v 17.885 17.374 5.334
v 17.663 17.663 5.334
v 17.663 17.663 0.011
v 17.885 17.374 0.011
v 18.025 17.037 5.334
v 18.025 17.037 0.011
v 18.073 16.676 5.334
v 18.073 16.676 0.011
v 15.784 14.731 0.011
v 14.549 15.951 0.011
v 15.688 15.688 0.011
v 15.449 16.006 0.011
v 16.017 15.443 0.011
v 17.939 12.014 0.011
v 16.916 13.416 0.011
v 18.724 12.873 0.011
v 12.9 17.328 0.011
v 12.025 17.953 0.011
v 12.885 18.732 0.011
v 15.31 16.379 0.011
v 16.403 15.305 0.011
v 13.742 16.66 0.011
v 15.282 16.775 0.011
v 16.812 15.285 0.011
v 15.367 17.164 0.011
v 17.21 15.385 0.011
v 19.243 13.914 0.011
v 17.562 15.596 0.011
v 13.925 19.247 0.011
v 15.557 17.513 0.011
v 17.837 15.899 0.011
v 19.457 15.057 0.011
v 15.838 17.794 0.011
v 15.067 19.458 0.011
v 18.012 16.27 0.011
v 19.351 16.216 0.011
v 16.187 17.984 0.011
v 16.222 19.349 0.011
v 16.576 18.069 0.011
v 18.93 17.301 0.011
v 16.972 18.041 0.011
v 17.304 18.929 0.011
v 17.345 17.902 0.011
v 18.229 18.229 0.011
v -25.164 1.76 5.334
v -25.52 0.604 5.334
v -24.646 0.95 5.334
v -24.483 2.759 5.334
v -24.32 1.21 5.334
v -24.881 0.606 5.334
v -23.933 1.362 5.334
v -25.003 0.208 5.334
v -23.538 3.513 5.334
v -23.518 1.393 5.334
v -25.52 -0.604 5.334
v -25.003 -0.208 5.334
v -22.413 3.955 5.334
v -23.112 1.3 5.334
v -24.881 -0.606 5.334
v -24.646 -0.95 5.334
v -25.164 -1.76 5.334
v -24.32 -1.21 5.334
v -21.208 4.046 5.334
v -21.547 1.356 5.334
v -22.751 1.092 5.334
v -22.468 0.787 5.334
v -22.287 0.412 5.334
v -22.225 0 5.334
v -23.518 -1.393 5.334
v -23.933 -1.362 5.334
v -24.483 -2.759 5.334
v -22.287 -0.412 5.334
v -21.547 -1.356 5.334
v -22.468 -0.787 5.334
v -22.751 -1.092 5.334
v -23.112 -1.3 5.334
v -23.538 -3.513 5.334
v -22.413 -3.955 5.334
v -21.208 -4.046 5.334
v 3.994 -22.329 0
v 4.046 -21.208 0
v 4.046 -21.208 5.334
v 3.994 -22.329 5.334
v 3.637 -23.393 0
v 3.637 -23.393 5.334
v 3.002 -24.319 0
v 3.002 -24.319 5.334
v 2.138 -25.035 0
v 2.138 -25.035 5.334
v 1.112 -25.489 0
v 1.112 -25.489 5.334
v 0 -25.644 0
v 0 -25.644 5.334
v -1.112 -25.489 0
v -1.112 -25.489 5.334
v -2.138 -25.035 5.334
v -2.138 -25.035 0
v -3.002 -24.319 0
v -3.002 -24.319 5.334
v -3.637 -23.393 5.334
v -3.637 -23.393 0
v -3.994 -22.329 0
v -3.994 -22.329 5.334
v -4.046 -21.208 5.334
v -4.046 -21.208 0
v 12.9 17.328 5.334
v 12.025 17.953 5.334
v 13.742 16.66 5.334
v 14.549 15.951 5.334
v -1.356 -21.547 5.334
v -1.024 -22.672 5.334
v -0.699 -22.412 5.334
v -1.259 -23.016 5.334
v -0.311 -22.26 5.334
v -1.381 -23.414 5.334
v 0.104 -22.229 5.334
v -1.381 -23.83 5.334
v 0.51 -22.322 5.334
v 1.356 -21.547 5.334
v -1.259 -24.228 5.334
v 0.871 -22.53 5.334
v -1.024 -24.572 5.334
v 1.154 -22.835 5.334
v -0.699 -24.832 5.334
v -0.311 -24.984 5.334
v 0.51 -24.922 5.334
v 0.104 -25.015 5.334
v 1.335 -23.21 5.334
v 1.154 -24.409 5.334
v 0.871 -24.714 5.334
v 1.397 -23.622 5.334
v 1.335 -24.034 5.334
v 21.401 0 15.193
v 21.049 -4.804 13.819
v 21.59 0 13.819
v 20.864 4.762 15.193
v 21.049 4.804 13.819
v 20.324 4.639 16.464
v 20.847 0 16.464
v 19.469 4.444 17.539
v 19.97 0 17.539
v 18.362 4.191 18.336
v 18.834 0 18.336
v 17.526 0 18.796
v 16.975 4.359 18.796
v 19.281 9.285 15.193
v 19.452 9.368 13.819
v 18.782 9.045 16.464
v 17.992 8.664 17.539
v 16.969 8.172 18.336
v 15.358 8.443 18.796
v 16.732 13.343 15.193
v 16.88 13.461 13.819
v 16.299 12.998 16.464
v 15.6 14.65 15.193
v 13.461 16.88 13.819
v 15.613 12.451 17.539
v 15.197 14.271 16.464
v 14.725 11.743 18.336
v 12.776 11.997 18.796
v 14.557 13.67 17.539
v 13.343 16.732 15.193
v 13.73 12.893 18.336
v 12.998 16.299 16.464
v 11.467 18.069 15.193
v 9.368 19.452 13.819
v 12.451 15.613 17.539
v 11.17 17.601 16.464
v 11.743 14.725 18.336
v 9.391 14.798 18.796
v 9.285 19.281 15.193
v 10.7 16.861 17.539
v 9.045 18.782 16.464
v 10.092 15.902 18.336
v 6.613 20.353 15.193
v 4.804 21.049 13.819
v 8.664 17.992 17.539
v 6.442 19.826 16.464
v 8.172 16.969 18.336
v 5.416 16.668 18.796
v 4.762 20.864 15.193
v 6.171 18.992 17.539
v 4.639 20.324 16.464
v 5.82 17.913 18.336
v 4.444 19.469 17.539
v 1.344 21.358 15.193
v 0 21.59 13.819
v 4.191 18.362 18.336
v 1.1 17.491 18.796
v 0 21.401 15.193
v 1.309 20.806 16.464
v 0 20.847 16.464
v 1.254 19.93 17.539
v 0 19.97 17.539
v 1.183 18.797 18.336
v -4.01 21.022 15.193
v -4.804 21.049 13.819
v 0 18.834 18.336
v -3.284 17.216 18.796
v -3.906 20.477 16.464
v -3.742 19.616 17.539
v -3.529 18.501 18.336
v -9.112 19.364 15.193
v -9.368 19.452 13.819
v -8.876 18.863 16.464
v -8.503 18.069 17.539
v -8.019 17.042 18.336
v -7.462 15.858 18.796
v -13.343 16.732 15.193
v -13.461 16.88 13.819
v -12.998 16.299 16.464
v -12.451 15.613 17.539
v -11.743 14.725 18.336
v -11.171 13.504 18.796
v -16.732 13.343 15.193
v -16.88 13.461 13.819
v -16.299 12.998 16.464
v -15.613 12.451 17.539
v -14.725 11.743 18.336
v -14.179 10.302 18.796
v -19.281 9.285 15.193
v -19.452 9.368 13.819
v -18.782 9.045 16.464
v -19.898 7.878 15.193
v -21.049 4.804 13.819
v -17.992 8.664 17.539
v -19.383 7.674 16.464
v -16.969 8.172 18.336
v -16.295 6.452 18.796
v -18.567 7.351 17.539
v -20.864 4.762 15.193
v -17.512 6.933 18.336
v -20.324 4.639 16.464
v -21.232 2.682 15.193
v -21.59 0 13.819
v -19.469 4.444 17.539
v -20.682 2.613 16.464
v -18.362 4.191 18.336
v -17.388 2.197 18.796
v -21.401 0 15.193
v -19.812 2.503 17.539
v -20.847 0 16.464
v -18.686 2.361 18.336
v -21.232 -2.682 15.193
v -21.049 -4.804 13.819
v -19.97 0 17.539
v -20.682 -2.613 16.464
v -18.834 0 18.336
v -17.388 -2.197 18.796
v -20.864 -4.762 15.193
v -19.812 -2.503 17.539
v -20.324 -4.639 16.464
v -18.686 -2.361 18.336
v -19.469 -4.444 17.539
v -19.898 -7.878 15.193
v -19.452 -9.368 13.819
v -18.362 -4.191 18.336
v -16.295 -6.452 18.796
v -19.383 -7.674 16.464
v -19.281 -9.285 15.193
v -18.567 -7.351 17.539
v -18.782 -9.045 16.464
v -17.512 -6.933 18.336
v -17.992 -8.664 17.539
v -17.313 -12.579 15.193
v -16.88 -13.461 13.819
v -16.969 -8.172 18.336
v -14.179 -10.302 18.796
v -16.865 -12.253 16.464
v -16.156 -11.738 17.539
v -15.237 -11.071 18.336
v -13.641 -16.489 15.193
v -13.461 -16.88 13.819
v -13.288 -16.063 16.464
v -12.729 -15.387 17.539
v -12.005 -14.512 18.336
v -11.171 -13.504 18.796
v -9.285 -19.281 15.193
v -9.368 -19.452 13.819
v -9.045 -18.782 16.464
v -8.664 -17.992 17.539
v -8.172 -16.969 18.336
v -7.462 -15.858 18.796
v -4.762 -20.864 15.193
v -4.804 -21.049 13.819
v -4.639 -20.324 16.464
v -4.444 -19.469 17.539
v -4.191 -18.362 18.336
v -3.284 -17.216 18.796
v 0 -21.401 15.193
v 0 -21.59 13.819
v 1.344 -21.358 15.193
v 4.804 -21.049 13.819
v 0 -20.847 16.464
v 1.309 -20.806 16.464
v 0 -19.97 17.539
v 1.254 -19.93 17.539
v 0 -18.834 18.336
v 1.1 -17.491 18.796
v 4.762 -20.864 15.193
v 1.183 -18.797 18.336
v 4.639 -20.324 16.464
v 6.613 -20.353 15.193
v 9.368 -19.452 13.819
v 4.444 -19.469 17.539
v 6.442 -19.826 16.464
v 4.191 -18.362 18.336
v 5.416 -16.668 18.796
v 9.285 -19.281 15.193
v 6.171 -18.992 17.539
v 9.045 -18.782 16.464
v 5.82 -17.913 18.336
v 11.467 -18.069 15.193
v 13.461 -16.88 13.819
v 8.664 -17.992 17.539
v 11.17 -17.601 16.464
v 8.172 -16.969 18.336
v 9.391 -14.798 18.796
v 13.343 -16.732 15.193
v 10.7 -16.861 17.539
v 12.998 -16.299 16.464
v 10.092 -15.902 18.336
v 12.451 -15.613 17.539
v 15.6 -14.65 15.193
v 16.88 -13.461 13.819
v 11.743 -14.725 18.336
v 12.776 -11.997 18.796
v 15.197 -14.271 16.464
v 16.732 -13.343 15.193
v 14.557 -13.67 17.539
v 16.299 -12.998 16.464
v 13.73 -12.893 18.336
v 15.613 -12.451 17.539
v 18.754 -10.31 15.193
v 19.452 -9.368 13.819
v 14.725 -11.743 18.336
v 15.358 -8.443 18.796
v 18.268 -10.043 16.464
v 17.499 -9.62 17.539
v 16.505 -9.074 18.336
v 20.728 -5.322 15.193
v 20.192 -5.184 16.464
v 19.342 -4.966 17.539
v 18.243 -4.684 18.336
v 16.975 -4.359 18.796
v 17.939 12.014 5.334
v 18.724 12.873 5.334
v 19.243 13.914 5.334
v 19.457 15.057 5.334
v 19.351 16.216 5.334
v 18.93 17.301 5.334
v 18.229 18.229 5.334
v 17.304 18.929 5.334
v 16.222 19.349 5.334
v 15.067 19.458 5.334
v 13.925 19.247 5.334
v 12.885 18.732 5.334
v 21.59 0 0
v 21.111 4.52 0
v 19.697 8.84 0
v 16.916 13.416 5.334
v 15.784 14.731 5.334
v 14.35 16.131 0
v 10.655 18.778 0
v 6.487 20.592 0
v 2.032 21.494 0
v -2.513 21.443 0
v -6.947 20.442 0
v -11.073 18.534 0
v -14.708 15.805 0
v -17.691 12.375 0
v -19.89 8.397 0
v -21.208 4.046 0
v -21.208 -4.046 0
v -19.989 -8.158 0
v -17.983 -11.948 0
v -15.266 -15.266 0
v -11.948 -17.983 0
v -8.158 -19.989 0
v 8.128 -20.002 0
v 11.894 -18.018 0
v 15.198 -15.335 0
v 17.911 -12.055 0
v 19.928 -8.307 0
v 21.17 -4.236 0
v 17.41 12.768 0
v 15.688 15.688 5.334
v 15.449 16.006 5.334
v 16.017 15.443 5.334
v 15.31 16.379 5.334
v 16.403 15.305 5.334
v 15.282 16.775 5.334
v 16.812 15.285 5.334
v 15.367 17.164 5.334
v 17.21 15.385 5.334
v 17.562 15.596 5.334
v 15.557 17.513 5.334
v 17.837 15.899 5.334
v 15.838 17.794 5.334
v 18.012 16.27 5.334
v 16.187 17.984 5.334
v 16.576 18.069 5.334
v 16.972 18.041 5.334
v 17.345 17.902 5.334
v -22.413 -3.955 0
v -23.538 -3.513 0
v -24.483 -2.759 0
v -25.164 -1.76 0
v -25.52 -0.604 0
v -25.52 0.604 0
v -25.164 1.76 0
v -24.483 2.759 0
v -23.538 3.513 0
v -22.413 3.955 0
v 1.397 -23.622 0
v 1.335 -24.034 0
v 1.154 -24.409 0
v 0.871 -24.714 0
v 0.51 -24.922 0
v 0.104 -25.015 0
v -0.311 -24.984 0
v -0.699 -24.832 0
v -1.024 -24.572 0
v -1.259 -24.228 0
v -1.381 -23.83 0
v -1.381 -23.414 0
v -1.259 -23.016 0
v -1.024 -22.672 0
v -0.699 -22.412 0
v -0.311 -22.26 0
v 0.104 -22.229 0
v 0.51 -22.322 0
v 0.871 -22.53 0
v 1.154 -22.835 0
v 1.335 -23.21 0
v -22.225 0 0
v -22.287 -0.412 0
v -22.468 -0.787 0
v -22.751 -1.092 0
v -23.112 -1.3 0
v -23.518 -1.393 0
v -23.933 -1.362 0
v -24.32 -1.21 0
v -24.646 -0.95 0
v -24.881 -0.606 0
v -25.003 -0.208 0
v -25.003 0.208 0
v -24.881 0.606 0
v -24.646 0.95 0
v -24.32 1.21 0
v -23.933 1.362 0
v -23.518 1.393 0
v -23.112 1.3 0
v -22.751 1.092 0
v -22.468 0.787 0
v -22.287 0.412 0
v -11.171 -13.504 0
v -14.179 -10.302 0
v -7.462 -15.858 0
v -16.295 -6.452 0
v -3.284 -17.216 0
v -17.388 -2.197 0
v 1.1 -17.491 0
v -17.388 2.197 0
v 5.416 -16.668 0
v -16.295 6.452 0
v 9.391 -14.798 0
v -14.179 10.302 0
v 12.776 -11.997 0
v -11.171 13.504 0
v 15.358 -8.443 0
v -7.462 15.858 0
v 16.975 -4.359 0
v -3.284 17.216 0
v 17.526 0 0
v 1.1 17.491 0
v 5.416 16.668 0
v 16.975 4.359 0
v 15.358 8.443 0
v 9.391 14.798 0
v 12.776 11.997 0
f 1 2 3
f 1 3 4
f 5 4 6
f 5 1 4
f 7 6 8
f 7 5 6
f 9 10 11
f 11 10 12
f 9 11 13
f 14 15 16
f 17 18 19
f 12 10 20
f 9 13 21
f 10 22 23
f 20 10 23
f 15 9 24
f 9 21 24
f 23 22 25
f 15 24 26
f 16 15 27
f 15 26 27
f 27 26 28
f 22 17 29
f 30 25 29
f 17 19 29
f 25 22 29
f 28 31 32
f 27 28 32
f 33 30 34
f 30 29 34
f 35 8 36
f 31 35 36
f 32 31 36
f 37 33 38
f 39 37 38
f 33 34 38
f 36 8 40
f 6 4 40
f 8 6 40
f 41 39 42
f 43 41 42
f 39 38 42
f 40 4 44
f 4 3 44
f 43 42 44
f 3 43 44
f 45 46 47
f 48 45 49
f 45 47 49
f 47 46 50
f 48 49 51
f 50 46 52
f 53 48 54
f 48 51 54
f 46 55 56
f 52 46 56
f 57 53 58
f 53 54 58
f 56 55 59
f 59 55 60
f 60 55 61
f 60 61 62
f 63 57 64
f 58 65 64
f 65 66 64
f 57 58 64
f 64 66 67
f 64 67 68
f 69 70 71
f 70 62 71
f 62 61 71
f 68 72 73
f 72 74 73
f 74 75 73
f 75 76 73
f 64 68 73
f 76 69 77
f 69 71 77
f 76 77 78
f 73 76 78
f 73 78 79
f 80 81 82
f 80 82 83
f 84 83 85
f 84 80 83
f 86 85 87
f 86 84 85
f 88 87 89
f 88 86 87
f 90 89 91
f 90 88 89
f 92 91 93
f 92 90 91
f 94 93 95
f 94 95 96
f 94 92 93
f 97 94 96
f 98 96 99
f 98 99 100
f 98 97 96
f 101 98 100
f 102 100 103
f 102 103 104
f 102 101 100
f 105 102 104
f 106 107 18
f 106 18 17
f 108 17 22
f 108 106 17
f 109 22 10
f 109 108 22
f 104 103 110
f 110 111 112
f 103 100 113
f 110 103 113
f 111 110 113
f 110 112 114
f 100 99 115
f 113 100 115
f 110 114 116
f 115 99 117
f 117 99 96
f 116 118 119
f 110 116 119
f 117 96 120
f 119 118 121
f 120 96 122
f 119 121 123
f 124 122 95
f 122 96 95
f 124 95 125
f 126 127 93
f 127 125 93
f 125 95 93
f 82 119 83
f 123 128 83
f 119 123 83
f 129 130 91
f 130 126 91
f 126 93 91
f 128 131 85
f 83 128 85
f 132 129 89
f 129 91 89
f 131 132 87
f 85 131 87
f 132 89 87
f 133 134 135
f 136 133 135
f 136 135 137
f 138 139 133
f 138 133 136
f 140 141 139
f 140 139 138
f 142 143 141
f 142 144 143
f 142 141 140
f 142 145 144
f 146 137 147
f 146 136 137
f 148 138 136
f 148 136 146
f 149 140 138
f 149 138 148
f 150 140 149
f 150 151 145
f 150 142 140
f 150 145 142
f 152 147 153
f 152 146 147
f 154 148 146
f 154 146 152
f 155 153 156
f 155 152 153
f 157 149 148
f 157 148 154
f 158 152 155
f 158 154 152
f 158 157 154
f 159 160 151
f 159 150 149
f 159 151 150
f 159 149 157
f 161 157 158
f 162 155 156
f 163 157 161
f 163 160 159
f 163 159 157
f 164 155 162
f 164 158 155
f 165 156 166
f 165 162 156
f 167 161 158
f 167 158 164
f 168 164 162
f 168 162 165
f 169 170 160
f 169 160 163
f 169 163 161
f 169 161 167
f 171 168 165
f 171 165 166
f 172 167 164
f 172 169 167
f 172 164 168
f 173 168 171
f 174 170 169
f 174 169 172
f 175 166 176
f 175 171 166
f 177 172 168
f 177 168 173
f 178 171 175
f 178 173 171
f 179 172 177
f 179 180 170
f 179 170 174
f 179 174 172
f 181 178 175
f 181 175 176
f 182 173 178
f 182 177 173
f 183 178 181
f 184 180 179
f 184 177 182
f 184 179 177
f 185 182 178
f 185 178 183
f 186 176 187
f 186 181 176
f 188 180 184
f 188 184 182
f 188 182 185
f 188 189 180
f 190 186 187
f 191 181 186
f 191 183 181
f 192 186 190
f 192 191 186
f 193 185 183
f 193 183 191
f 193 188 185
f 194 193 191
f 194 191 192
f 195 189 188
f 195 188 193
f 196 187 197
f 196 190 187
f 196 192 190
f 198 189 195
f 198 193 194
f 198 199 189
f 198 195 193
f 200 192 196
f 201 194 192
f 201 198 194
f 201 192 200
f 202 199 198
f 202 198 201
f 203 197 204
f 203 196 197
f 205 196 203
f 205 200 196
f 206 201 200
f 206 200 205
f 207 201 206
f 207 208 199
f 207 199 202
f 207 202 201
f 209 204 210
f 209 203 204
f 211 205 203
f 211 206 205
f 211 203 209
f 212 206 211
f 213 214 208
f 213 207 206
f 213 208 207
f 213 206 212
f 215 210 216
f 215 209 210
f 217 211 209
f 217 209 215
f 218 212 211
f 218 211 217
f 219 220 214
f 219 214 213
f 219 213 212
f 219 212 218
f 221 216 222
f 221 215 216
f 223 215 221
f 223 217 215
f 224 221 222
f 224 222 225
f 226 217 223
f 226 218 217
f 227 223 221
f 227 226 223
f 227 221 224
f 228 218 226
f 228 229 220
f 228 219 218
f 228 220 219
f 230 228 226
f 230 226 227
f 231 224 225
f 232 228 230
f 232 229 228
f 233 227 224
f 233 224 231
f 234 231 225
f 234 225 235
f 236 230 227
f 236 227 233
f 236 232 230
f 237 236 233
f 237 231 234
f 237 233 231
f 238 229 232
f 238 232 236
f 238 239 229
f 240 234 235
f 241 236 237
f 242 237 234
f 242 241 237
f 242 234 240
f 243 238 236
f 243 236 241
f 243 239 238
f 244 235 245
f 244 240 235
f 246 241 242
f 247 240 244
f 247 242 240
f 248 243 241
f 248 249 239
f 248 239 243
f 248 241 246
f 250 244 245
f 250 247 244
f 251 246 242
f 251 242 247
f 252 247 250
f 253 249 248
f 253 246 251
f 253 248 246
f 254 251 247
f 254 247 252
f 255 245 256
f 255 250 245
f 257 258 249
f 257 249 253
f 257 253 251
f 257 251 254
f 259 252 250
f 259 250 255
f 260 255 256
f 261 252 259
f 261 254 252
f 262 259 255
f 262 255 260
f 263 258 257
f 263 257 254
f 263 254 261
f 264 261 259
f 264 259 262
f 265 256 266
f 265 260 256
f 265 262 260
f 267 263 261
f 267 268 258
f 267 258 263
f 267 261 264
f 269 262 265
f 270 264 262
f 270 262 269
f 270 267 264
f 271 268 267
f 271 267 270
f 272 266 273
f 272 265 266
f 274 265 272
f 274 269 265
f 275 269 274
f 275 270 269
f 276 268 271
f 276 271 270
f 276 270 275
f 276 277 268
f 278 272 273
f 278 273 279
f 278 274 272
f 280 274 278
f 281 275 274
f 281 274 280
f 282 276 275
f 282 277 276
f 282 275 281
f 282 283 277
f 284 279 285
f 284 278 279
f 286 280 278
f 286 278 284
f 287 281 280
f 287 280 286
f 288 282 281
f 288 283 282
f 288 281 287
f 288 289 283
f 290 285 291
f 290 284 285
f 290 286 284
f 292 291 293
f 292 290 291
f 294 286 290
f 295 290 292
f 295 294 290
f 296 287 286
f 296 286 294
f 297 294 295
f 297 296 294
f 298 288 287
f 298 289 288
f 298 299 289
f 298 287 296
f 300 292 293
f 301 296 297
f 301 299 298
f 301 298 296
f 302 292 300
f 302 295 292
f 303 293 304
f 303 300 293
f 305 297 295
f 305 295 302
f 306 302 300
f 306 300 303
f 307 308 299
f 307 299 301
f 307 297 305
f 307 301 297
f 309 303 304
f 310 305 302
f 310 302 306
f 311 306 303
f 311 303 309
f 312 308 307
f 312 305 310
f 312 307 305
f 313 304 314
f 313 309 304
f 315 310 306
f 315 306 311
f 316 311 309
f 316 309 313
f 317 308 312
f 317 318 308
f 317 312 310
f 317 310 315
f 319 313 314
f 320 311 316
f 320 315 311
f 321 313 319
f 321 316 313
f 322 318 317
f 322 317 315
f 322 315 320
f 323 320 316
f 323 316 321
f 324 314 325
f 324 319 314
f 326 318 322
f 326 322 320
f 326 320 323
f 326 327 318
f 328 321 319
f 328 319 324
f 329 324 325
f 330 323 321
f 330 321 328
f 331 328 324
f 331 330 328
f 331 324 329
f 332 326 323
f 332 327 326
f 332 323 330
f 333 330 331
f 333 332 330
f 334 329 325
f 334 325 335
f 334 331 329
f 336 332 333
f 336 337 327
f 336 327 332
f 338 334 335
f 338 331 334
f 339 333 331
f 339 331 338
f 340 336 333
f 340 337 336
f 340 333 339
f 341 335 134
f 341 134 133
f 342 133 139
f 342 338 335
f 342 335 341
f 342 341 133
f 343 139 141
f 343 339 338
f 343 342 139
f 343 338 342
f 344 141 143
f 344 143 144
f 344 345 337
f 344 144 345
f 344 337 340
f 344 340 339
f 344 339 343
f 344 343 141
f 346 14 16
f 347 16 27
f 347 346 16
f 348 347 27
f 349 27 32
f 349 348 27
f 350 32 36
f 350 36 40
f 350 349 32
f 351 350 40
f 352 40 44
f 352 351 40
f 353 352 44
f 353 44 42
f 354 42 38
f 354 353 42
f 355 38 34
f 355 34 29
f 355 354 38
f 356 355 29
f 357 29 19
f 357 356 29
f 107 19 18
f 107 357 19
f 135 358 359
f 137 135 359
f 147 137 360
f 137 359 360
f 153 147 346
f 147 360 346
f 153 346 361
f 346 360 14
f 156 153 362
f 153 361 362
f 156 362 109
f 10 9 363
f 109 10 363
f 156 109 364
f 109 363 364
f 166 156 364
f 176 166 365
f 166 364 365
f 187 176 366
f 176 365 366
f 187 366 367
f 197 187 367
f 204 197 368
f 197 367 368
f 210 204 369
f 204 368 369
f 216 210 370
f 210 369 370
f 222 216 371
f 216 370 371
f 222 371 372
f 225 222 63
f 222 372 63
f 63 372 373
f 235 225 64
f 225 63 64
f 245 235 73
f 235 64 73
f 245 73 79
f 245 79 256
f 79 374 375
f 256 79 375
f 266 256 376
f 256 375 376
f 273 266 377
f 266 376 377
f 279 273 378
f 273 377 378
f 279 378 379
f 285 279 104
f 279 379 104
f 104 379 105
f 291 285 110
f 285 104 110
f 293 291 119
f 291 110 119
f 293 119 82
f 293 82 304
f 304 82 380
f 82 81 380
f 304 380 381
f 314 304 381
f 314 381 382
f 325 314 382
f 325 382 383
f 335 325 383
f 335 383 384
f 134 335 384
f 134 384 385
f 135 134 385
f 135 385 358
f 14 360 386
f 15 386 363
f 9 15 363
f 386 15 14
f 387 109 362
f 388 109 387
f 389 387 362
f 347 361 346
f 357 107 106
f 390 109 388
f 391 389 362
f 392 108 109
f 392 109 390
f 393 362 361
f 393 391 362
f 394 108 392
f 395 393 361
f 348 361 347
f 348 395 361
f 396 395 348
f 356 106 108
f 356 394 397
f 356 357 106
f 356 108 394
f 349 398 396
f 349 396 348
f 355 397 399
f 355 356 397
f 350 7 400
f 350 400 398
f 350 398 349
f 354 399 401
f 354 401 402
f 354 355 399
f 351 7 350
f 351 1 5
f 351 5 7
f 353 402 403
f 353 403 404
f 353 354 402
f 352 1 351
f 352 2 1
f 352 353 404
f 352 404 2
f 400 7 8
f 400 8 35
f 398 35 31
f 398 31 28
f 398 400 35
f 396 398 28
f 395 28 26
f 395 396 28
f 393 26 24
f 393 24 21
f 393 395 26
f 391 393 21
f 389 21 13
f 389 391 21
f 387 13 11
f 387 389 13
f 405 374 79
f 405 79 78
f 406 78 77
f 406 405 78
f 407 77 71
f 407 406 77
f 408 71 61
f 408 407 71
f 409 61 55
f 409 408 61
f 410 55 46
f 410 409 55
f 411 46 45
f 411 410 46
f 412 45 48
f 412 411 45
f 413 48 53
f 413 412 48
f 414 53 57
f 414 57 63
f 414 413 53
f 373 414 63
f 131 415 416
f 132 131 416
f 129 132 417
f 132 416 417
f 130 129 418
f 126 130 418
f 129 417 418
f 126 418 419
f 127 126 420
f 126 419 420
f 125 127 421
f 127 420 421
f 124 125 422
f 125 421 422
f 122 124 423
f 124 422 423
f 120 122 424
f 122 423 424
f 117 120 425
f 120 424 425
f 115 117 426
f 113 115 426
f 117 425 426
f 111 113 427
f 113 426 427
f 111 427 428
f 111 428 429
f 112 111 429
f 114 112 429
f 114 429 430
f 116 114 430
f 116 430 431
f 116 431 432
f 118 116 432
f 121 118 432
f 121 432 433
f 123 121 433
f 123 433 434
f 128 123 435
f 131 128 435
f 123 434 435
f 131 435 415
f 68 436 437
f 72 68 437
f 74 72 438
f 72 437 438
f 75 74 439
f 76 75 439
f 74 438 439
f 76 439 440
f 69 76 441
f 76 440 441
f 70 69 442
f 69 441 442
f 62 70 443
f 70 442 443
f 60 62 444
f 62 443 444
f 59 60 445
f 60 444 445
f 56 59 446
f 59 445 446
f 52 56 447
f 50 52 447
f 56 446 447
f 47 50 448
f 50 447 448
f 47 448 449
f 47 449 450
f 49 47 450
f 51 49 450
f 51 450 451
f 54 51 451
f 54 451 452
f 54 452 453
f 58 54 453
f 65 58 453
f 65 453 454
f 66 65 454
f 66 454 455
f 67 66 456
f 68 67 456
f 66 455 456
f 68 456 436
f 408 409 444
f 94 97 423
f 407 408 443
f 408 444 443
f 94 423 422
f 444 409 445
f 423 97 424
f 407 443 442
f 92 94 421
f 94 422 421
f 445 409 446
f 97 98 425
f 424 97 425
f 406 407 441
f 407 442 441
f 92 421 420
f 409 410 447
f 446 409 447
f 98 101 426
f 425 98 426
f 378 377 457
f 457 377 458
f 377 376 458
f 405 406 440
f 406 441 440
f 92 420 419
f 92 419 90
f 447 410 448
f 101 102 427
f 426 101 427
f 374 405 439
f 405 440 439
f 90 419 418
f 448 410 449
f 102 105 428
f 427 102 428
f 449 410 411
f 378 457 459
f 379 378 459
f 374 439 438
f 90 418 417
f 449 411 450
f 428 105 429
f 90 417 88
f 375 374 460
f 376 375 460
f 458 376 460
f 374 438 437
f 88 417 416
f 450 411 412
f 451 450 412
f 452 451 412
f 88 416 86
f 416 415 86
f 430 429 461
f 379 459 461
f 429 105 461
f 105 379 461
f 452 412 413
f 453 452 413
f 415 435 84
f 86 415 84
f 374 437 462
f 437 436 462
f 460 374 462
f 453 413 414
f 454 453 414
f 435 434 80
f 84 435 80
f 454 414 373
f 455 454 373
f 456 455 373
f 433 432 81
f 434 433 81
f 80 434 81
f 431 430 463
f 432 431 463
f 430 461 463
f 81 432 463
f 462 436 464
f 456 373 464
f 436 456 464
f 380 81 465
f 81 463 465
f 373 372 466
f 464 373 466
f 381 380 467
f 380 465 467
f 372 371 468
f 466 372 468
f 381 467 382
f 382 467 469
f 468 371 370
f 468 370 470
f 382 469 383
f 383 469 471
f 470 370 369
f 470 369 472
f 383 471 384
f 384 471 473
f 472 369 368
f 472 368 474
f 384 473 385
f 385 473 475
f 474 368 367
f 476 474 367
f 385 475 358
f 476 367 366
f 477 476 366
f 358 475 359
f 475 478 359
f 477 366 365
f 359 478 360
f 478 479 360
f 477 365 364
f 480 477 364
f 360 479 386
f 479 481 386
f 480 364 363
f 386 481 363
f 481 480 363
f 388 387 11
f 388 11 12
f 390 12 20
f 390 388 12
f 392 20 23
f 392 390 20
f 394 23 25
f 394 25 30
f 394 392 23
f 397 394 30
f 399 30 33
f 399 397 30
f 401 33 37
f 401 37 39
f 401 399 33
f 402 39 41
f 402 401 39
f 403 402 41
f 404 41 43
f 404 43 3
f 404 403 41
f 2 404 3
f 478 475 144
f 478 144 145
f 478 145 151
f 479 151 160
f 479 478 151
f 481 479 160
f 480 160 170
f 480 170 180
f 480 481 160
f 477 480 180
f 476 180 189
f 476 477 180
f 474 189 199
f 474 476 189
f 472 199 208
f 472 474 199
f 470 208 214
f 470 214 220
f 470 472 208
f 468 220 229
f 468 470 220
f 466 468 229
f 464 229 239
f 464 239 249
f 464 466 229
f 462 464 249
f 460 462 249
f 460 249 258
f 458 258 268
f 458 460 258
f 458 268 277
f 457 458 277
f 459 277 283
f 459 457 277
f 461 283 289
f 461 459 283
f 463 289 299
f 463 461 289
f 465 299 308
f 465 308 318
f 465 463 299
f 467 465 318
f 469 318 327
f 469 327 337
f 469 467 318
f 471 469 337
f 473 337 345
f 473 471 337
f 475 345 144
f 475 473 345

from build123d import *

# Parameters (mm, degrees)
F0_R     = 21.59
F0_R_2   = 17.526
F1_DEPTH = 18.796
F2_R     = 1.397
F3_DEPTH = 5.334
F5_DEPTH = 5.32335


# Not quite as in the source:
# - a fillet or chamfer that OpenCascade refuses, or shapes differently, is made with other operations: its cross-section is extruded or revolved along the edge and cut away or added


with BuildPart() as f1:
    # F0 (on Top) → F1 (new body)
    with BuildSketch(Plane.XY):
        Circle(F0_R)
        Circle(F0_R_2, mode=Mode.SUBTRACT)
    extrude(amount=F1_DEPTH)

    # F2 (on face) → F3 (join)
    with BuildSketch(Plane(origin=(0, 0, 0), x_dir=(1, 0, 0), z_dir=(0, 0, -1))):
        with BuildLine():
            ThreePointArc((-21.2075058824, -4.0459602383), (-21.5081828799, 0), (-21.2075058824, 4.0459602383))
            ThreePointArc((-21.2075058824, 4.0459602383), (-25.5653001948, 0), (-21.2075058824, -4.0459602383))
        make_face()
        with Locations((-23.622, 0)):
            Circle(F2_R, mode=Mode.SUBTRACT)
        with BuildLine():
            ThreePointArc((-4.0459602383, 21.2075058824), (0, 21.59), (4.0459602383, 21.2075058824))
            ThreePointArc((4.0459602383, 21.2075058824), (0, 25.6437689885), (-4.0459602383, 21.2075058824))
        make_face()
        with Locations((0, 23.622)):
            Circle(F2_R, mode=Mode.SUBTRACT)
    extrude(amount=-F3_DEPTH)

    # F4 (on face) → F5 (join)
    with BuildSketch(Plane.XY.offset(5.334)):
        with BuildLine():
            ThreePointArc((15.2619734187, 15.2619734187), (16.6668392005, 13.6913700024), (17.9108306766, 11.990508996))
            ThreePointArc((17.9108306766, 11.990508996), (19.4564957211, 15.0391701429), (18.2294215901, 18.2294215901))
            Line((18.2294215901, 18.2294215901), (17.6633479303, 17.6633479303))
            ThreePointArc((17.6633479303, 17.6633479303), (17.9661794639, 17.210128512), (18.072519757, 16.675519757))
            ThreePointArc((18.072519757, 16.675519757), (17.210128512, 15.3848600501), (15.6876915837, 15.6876915837))
            Line((15.6876915837, 15.6876915837), (15.2619734187, 15.2619734187))
        make_face()
        with BuildLine():
            Line((17.6633479303, 17.6633479303), (18.2294215901, 18.2294215901))
            ThreePointArc((18.2294215901, 18.2294215901), (15.0665422687, 19.4578041419), (12.025389791, 17.9531045364))
            ThreePointArc((12.025389791, 17.9531045364), (13.7098474372, 16.6871156464), (15.2619734187, 15.2619734187))
            Line((15.2619734187, 15.2619734187), (15.6876915837, 15.6876915837))
            ThreePointArc((15.6876915837, 15.6876915837), (15.6876915837, 17.6633479303), (17.6633479303, 17.6633479303))
        make_face()
    extrude(amount=-F5_DEPTH)

    # F6: fillet of radius 5.08 on 1 edges, made by hand

    # F6_s1 → F6_t2 (revolve, cut)
    with BuildSketch(Plane.XZ):
        with BuildLine():
            ThreePointArc((21.59, 13.8186368427), (20.4449510797, 17.0315109454), (17.526, 18.796))
            Line((17.526, 18.796), (21.59, 18.796))
            Line((21.59, 18.796), (21.59, 13.8186368427))
        make_face()
    revolve(axis=Axis((0, 0, 18.796), (0, 0, 1)), mode=Mode.SUBTRACT)


solid = f1.part
